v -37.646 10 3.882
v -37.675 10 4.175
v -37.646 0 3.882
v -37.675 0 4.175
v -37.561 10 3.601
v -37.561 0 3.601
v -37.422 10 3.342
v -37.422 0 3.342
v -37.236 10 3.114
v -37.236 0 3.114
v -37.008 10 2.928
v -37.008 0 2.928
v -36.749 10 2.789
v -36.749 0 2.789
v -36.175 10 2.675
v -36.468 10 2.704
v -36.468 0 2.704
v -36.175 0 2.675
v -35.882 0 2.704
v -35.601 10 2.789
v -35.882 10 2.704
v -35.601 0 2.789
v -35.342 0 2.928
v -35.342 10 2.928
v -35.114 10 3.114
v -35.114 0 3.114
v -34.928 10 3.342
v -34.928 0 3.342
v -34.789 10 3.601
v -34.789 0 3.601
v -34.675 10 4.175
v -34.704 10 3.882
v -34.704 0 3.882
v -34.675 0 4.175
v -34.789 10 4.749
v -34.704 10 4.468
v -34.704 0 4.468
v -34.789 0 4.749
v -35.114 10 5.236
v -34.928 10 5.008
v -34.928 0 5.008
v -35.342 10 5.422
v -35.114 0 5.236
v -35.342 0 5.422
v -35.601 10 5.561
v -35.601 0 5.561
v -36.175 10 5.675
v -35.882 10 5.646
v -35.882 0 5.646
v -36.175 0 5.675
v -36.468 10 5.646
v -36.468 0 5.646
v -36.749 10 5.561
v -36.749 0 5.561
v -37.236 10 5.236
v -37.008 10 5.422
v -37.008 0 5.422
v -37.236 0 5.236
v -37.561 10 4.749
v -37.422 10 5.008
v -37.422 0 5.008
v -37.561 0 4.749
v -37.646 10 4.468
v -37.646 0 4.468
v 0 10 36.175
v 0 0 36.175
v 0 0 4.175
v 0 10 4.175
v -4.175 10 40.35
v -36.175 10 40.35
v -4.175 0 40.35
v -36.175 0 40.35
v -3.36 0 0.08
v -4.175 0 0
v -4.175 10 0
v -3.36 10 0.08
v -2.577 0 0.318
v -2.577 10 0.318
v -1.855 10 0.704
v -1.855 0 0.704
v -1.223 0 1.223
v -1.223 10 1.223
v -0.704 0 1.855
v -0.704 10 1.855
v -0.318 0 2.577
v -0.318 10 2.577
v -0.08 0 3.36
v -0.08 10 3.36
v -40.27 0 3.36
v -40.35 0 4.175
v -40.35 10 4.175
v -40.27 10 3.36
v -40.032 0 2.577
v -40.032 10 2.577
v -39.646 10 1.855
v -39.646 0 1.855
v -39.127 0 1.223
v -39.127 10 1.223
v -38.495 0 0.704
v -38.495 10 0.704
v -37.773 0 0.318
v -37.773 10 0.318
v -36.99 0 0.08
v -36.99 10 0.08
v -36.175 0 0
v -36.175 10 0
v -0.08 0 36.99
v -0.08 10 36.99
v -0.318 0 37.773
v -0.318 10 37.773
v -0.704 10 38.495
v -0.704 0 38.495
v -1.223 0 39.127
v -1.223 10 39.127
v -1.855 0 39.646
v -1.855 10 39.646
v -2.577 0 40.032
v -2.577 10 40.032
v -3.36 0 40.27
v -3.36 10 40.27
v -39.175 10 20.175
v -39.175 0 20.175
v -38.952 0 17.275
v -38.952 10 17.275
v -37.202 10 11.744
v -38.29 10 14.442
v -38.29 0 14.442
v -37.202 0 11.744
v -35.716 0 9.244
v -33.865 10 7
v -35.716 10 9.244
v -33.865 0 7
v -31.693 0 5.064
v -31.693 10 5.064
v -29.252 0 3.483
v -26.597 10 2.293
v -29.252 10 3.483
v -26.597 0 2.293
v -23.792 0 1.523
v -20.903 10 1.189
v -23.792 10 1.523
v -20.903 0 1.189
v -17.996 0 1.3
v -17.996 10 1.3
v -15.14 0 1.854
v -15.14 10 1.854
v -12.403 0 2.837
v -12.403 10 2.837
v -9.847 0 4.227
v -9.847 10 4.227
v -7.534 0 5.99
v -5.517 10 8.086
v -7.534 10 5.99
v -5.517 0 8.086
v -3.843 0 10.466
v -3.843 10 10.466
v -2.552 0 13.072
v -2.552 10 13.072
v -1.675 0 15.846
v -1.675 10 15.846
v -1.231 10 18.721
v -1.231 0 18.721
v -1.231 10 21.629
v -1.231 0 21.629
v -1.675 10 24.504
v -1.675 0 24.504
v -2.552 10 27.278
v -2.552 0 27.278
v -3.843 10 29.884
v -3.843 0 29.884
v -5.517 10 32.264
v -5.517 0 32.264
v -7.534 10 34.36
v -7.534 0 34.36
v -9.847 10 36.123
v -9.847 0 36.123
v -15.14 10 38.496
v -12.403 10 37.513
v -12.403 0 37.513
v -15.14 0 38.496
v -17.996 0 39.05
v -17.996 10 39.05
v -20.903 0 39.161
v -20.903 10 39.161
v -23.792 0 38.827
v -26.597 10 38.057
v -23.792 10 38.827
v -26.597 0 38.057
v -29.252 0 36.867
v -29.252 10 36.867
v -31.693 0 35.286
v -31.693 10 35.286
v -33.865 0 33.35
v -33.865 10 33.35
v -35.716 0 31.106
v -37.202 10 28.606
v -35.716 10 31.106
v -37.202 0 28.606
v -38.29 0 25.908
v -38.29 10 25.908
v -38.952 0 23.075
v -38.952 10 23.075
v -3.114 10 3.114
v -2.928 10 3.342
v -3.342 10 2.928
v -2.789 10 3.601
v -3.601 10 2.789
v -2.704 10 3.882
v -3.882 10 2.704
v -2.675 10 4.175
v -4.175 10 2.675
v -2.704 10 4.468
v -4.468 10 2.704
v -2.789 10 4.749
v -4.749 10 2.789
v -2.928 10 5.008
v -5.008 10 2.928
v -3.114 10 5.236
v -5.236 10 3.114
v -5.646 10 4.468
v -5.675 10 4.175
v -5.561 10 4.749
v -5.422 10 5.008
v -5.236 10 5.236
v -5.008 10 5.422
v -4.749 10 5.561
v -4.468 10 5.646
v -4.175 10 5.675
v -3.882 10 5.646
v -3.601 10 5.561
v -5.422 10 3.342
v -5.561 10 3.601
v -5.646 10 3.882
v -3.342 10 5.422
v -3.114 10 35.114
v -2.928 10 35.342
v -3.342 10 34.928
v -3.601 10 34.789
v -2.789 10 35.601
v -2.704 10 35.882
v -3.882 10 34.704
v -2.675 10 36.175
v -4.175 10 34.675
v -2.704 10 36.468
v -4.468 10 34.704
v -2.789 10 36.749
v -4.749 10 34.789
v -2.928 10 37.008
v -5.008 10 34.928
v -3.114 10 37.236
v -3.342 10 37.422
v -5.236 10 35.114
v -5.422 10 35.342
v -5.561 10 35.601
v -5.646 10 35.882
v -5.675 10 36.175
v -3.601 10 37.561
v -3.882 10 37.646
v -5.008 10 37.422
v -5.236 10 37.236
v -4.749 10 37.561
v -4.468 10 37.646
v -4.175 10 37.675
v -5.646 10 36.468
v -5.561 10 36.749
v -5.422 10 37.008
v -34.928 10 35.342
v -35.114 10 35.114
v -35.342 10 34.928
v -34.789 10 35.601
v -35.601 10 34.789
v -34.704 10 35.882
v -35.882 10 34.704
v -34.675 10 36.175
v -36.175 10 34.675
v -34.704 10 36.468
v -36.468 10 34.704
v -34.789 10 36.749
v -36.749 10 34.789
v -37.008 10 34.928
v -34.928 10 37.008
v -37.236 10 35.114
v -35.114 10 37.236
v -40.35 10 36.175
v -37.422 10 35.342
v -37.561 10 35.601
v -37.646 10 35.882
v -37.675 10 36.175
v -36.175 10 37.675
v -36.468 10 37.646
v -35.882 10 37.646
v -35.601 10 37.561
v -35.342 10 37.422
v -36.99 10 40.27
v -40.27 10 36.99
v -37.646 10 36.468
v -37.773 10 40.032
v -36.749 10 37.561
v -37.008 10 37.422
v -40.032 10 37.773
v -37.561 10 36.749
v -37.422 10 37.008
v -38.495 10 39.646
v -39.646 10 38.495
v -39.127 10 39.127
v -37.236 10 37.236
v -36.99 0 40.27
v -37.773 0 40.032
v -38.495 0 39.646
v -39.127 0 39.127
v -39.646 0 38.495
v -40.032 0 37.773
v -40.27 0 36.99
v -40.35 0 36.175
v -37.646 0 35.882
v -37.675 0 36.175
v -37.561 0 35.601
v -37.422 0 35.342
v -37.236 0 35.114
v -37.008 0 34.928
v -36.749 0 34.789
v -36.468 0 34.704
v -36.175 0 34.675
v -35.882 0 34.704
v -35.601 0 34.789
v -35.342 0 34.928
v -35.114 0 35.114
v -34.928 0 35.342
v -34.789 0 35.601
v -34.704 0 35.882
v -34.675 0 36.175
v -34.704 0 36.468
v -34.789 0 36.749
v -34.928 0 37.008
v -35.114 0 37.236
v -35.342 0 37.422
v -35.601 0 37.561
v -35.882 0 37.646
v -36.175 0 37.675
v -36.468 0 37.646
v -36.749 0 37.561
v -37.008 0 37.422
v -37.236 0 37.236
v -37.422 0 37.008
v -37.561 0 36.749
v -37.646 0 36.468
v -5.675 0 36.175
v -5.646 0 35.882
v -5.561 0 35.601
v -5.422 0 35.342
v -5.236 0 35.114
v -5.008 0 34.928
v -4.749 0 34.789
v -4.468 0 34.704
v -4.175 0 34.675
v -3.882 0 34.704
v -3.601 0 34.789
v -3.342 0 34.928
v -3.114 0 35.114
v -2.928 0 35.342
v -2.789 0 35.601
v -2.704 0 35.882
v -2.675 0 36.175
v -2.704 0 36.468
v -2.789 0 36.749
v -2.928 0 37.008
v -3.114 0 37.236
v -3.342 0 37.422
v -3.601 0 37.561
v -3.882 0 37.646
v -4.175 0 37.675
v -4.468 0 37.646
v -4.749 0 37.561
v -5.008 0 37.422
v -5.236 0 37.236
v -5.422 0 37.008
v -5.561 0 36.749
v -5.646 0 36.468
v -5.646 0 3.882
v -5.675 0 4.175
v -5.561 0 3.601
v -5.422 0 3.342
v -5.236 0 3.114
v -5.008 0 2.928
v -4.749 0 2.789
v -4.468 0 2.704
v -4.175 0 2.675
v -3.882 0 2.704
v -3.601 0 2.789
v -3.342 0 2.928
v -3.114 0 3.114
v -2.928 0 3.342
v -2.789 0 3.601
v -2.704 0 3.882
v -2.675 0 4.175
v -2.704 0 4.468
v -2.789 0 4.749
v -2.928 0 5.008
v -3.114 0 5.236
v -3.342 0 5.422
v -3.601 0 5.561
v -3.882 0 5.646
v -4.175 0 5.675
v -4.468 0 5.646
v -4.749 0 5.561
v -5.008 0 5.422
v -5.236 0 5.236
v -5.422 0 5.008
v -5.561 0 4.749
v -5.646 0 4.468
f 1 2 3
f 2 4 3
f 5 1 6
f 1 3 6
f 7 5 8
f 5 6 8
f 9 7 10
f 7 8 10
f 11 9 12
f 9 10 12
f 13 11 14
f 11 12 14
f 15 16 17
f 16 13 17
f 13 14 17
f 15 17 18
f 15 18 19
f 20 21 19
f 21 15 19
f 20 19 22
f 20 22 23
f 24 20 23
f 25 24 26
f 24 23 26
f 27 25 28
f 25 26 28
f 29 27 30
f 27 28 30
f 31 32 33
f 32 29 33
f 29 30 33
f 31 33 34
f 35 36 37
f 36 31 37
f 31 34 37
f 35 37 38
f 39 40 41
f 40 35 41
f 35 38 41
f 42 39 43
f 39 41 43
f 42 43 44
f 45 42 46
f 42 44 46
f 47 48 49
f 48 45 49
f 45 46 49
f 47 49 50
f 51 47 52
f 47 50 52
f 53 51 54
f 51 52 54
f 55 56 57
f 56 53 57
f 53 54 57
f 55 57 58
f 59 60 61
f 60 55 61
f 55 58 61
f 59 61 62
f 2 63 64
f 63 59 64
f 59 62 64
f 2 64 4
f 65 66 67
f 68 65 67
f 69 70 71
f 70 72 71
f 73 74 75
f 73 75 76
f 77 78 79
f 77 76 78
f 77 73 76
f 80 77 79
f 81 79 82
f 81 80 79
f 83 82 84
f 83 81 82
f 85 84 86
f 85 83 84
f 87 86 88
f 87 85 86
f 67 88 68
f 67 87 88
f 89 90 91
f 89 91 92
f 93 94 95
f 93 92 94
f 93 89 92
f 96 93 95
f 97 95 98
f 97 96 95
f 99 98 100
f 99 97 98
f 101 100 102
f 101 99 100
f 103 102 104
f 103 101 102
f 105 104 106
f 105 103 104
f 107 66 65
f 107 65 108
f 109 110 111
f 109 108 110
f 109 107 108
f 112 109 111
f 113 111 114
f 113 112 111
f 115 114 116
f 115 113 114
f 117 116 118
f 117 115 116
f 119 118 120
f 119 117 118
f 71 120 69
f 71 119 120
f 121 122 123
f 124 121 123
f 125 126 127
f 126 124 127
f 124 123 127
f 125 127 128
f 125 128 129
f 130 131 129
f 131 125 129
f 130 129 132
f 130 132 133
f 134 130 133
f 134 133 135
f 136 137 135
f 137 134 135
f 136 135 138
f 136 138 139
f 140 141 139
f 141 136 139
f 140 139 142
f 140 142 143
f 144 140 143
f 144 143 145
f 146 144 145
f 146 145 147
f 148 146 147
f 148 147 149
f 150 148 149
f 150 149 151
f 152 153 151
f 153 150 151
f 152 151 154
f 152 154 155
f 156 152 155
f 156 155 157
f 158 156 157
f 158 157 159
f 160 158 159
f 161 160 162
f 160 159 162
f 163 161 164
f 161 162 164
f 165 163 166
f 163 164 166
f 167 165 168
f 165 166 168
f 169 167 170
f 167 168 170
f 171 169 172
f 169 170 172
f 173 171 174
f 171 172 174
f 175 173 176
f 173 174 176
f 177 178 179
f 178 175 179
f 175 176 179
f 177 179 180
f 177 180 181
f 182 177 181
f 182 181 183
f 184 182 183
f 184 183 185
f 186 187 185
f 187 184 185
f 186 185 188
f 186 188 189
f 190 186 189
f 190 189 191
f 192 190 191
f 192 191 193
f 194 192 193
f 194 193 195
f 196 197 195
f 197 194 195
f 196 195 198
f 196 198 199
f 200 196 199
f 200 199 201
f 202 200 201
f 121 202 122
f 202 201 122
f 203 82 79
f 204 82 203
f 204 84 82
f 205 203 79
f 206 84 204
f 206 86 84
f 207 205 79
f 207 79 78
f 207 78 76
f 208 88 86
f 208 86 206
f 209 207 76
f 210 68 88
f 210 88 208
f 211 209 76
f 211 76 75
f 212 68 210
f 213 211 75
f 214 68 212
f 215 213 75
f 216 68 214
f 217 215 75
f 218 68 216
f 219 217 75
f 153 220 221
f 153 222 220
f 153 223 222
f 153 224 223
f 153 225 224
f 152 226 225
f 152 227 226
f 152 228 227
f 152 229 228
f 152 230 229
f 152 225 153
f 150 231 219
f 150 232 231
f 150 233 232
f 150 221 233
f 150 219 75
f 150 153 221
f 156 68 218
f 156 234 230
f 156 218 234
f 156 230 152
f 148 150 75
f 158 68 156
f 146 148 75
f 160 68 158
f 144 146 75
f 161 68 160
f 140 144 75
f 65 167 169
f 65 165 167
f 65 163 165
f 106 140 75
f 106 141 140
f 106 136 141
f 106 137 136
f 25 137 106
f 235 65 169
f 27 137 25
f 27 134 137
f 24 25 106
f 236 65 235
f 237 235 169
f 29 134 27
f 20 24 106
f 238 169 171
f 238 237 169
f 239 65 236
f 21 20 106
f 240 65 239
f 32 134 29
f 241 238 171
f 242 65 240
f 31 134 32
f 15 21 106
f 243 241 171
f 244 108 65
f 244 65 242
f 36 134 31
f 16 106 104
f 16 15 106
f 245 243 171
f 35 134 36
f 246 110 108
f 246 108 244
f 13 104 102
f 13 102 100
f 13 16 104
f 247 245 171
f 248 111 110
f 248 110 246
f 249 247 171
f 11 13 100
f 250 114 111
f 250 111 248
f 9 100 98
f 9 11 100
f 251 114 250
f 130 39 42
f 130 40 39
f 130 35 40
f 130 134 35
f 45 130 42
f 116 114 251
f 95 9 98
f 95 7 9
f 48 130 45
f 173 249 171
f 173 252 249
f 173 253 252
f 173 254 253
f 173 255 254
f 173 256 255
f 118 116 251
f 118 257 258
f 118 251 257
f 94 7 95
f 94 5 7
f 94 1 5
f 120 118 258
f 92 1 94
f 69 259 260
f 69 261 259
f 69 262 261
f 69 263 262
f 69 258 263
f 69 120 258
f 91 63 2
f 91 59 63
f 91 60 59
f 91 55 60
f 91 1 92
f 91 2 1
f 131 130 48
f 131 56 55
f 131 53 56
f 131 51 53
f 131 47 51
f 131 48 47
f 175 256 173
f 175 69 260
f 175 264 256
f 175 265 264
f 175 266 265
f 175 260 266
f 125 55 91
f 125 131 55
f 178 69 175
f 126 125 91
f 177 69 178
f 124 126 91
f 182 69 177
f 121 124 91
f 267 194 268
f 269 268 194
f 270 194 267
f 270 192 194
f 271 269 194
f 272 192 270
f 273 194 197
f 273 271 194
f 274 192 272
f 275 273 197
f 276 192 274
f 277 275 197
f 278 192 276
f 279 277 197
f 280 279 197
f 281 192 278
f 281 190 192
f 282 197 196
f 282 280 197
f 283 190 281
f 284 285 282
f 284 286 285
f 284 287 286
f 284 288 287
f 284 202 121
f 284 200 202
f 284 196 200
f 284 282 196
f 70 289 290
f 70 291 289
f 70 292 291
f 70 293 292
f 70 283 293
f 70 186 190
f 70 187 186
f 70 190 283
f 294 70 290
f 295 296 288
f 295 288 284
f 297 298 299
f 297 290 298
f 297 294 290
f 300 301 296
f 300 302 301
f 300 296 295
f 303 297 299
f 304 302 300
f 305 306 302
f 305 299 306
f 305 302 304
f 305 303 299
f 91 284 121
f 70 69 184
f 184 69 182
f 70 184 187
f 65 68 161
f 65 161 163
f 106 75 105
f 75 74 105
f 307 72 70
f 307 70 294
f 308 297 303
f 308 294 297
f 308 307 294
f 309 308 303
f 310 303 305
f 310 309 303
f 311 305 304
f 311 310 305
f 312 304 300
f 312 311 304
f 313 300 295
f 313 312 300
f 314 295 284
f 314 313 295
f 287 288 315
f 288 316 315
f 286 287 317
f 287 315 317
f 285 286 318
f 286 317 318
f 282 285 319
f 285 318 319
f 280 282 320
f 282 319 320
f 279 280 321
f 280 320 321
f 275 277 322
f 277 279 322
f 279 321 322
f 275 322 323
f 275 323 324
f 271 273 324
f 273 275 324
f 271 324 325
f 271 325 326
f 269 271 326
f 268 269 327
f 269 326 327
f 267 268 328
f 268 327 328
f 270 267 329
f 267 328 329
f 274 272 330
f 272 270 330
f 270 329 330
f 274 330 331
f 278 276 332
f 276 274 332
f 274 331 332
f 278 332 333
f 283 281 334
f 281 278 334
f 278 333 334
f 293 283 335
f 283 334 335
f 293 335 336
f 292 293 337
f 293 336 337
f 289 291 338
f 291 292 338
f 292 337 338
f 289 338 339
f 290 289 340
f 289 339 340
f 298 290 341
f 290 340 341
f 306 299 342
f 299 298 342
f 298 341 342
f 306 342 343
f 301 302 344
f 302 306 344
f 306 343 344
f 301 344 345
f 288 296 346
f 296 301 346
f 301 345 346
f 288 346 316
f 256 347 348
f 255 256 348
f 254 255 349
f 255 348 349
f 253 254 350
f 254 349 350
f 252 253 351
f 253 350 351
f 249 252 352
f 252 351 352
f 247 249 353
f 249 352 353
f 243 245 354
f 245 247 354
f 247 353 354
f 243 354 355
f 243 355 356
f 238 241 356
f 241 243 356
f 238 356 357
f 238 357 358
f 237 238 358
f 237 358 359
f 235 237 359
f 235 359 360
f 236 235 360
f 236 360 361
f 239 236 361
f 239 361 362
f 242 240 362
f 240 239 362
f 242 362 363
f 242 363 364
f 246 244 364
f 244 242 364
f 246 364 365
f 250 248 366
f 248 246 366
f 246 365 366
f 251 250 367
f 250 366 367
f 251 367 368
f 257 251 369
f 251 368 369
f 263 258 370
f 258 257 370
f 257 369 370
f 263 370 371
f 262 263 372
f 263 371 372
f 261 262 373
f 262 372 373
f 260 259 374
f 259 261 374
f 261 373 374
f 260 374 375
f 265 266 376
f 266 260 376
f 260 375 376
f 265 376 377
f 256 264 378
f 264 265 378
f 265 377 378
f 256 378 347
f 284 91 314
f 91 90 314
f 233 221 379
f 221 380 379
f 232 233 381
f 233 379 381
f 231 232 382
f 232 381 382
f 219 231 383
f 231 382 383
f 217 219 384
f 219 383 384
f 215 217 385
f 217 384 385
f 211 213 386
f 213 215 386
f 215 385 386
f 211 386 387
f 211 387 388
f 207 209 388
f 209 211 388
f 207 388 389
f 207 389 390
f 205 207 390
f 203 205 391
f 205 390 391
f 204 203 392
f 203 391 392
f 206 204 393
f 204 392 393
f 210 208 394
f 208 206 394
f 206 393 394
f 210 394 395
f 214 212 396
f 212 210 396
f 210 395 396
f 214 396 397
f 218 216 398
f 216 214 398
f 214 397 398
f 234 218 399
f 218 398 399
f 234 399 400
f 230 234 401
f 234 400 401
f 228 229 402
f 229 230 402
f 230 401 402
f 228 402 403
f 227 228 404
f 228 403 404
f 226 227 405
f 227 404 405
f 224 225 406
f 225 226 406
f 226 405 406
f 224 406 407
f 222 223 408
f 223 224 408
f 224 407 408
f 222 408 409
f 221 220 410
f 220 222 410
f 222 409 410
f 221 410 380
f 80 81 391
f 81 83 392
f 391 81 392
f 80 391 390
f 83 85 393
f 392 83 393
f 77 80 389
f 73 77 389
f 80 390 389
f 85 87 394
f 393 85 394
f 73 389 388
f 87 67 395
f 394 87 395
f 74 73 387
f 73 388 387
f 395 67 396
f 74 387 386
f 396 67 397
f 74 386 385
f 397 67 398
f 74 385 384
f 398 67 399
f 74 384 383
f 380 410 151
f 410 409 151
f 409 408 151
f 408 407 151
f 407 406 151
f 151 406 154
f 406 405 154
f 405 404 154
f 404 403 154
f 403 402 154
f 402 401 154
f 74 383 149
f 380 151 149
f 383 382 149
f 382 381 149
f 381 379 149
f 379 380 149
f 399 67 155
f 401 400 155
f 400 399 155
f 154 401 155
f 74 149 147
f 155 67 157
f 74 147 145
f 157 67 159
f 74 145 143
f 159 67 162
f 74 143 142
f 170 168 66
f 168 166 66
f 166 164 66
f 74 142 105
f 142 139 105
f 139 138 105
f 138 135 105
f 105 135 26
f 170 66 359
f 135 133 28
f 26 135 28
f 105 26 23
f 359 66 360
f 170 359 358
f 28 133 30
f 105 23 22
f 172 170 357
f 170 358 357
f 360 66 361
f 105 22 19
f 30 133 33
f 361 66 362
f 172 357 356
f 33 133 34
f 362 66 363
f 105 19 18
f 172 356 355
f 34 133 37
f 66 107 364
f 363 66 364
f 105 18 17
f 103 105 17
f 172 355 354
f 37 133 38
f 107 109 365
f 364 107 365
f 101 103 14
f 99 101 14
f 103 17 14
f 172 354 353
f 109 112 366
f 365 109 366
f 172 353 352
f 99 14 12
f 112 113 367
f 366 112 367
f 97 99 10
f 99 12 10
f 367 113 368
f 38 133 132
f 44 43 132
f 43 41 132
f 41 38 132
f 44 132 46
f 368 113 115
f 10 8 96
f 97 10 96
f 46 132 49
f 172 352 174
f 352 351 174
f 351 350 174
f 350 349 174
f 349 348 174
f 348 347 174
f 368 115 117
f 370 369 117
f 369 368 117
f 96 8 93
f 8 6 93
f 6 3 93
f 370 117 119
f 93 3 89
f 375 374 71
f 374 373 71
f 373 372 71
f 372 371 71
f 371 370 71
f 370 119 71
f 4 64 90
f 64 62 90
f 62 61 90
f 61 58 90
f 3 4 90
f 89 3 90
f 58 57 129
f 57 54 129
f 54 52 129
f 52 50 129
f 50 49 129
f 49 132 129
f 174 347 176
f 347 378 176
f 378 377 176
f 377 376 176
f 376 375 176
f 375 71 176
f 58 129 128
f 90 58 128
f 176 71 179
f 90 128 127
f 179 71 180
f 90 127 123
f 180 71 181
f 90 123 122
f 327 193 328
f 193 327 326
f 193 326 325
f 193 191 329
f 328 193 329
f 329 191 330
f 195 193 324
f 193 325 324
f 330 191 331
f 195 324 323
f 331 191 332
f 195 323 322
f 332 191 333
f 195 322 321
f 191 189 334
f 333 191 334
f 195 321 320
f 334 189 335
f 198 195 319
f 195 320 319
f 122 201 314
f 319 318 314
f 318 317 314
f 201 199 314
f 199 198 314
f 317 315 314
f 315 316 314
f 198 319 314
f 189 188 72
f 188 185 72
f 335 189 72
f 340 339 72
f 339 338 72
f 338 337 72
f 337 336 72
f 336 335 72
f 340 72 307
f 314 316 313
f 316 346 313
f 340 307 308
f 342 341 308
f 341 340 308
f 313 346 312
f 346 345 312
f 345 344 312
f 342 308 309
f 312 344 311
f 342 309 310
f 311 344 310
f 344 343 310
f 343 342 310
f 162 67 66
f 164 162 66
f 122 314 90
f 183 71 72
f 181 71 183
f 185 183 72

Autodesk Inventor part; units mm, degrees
ref_plane "YZ Plane" through (0, 0, 0) normal (1, 0, 0) x (0, 1, 0)
ref_plane "XZ Plane" through (0, 0, 0) normal (0, 1, 0) x (-1, 0, 0)
ref_plane "XY Plane" through (0, 0, 0) normal (0, 0, 1) x (1, 0, 0)
sketch "Sketch1" plane through (0, 0, 0) normal (0, 1, 0) x (-1, 0, 0)
  line L0 (4.175, 0) -> (36.175, 0)
  line L1 (40.35, 4.175) -> (40.35, 36.175)
  line L2 (36.175, 40.35) -> (4.175, 40.35)
  line L3 (0, 36.175) -> (0, 4.175)
  circle A0 centre (4.175, 4.175) radius 1.5
  circle A1 centre (36.175, 4.175) radius 1.5
  circle A2 centre (4.175, 36.175) radius 1.5
  circle A3 centre (36.175, 36.175) radius 1.5
  arc A4 (4.175, 40.35) -> (0, 36.175) centre (4.175, 36.175) ccw
  arc A5 (40.35, 36.175) -> (36.175, 40.35) centre (36.175, 36.175) ccw
  arc A6 (36.175, 0) -> (40.35, 4.175) centre (36.175, 4.175) ccw
  arc A7 (0, 4.175) -> (4.175, 0) centre (4.175, 4.175) ccw
  circle A8 centre (20.175, 20.175) radius 19
  point P0 (0, 0)
  point P1 (40.35, 0)
  point P2 (40.35, 40.35)
  dimension "d0" = 40.35
  dimension "d1" = 40.35
  dimension "d2" = 3
  dimension "d5" = 32
  dimension "d8" = 32
  dimension "d12" = 4.175
  dimension "d15" = 38
  dimension "d16" = 20.175
  dimension "d17" = 20.175
extrude "Extrusion2" add sketch "Sketch1" along normal blind 10
properties part number "Ventilador" material "Rubber, Silicone"
